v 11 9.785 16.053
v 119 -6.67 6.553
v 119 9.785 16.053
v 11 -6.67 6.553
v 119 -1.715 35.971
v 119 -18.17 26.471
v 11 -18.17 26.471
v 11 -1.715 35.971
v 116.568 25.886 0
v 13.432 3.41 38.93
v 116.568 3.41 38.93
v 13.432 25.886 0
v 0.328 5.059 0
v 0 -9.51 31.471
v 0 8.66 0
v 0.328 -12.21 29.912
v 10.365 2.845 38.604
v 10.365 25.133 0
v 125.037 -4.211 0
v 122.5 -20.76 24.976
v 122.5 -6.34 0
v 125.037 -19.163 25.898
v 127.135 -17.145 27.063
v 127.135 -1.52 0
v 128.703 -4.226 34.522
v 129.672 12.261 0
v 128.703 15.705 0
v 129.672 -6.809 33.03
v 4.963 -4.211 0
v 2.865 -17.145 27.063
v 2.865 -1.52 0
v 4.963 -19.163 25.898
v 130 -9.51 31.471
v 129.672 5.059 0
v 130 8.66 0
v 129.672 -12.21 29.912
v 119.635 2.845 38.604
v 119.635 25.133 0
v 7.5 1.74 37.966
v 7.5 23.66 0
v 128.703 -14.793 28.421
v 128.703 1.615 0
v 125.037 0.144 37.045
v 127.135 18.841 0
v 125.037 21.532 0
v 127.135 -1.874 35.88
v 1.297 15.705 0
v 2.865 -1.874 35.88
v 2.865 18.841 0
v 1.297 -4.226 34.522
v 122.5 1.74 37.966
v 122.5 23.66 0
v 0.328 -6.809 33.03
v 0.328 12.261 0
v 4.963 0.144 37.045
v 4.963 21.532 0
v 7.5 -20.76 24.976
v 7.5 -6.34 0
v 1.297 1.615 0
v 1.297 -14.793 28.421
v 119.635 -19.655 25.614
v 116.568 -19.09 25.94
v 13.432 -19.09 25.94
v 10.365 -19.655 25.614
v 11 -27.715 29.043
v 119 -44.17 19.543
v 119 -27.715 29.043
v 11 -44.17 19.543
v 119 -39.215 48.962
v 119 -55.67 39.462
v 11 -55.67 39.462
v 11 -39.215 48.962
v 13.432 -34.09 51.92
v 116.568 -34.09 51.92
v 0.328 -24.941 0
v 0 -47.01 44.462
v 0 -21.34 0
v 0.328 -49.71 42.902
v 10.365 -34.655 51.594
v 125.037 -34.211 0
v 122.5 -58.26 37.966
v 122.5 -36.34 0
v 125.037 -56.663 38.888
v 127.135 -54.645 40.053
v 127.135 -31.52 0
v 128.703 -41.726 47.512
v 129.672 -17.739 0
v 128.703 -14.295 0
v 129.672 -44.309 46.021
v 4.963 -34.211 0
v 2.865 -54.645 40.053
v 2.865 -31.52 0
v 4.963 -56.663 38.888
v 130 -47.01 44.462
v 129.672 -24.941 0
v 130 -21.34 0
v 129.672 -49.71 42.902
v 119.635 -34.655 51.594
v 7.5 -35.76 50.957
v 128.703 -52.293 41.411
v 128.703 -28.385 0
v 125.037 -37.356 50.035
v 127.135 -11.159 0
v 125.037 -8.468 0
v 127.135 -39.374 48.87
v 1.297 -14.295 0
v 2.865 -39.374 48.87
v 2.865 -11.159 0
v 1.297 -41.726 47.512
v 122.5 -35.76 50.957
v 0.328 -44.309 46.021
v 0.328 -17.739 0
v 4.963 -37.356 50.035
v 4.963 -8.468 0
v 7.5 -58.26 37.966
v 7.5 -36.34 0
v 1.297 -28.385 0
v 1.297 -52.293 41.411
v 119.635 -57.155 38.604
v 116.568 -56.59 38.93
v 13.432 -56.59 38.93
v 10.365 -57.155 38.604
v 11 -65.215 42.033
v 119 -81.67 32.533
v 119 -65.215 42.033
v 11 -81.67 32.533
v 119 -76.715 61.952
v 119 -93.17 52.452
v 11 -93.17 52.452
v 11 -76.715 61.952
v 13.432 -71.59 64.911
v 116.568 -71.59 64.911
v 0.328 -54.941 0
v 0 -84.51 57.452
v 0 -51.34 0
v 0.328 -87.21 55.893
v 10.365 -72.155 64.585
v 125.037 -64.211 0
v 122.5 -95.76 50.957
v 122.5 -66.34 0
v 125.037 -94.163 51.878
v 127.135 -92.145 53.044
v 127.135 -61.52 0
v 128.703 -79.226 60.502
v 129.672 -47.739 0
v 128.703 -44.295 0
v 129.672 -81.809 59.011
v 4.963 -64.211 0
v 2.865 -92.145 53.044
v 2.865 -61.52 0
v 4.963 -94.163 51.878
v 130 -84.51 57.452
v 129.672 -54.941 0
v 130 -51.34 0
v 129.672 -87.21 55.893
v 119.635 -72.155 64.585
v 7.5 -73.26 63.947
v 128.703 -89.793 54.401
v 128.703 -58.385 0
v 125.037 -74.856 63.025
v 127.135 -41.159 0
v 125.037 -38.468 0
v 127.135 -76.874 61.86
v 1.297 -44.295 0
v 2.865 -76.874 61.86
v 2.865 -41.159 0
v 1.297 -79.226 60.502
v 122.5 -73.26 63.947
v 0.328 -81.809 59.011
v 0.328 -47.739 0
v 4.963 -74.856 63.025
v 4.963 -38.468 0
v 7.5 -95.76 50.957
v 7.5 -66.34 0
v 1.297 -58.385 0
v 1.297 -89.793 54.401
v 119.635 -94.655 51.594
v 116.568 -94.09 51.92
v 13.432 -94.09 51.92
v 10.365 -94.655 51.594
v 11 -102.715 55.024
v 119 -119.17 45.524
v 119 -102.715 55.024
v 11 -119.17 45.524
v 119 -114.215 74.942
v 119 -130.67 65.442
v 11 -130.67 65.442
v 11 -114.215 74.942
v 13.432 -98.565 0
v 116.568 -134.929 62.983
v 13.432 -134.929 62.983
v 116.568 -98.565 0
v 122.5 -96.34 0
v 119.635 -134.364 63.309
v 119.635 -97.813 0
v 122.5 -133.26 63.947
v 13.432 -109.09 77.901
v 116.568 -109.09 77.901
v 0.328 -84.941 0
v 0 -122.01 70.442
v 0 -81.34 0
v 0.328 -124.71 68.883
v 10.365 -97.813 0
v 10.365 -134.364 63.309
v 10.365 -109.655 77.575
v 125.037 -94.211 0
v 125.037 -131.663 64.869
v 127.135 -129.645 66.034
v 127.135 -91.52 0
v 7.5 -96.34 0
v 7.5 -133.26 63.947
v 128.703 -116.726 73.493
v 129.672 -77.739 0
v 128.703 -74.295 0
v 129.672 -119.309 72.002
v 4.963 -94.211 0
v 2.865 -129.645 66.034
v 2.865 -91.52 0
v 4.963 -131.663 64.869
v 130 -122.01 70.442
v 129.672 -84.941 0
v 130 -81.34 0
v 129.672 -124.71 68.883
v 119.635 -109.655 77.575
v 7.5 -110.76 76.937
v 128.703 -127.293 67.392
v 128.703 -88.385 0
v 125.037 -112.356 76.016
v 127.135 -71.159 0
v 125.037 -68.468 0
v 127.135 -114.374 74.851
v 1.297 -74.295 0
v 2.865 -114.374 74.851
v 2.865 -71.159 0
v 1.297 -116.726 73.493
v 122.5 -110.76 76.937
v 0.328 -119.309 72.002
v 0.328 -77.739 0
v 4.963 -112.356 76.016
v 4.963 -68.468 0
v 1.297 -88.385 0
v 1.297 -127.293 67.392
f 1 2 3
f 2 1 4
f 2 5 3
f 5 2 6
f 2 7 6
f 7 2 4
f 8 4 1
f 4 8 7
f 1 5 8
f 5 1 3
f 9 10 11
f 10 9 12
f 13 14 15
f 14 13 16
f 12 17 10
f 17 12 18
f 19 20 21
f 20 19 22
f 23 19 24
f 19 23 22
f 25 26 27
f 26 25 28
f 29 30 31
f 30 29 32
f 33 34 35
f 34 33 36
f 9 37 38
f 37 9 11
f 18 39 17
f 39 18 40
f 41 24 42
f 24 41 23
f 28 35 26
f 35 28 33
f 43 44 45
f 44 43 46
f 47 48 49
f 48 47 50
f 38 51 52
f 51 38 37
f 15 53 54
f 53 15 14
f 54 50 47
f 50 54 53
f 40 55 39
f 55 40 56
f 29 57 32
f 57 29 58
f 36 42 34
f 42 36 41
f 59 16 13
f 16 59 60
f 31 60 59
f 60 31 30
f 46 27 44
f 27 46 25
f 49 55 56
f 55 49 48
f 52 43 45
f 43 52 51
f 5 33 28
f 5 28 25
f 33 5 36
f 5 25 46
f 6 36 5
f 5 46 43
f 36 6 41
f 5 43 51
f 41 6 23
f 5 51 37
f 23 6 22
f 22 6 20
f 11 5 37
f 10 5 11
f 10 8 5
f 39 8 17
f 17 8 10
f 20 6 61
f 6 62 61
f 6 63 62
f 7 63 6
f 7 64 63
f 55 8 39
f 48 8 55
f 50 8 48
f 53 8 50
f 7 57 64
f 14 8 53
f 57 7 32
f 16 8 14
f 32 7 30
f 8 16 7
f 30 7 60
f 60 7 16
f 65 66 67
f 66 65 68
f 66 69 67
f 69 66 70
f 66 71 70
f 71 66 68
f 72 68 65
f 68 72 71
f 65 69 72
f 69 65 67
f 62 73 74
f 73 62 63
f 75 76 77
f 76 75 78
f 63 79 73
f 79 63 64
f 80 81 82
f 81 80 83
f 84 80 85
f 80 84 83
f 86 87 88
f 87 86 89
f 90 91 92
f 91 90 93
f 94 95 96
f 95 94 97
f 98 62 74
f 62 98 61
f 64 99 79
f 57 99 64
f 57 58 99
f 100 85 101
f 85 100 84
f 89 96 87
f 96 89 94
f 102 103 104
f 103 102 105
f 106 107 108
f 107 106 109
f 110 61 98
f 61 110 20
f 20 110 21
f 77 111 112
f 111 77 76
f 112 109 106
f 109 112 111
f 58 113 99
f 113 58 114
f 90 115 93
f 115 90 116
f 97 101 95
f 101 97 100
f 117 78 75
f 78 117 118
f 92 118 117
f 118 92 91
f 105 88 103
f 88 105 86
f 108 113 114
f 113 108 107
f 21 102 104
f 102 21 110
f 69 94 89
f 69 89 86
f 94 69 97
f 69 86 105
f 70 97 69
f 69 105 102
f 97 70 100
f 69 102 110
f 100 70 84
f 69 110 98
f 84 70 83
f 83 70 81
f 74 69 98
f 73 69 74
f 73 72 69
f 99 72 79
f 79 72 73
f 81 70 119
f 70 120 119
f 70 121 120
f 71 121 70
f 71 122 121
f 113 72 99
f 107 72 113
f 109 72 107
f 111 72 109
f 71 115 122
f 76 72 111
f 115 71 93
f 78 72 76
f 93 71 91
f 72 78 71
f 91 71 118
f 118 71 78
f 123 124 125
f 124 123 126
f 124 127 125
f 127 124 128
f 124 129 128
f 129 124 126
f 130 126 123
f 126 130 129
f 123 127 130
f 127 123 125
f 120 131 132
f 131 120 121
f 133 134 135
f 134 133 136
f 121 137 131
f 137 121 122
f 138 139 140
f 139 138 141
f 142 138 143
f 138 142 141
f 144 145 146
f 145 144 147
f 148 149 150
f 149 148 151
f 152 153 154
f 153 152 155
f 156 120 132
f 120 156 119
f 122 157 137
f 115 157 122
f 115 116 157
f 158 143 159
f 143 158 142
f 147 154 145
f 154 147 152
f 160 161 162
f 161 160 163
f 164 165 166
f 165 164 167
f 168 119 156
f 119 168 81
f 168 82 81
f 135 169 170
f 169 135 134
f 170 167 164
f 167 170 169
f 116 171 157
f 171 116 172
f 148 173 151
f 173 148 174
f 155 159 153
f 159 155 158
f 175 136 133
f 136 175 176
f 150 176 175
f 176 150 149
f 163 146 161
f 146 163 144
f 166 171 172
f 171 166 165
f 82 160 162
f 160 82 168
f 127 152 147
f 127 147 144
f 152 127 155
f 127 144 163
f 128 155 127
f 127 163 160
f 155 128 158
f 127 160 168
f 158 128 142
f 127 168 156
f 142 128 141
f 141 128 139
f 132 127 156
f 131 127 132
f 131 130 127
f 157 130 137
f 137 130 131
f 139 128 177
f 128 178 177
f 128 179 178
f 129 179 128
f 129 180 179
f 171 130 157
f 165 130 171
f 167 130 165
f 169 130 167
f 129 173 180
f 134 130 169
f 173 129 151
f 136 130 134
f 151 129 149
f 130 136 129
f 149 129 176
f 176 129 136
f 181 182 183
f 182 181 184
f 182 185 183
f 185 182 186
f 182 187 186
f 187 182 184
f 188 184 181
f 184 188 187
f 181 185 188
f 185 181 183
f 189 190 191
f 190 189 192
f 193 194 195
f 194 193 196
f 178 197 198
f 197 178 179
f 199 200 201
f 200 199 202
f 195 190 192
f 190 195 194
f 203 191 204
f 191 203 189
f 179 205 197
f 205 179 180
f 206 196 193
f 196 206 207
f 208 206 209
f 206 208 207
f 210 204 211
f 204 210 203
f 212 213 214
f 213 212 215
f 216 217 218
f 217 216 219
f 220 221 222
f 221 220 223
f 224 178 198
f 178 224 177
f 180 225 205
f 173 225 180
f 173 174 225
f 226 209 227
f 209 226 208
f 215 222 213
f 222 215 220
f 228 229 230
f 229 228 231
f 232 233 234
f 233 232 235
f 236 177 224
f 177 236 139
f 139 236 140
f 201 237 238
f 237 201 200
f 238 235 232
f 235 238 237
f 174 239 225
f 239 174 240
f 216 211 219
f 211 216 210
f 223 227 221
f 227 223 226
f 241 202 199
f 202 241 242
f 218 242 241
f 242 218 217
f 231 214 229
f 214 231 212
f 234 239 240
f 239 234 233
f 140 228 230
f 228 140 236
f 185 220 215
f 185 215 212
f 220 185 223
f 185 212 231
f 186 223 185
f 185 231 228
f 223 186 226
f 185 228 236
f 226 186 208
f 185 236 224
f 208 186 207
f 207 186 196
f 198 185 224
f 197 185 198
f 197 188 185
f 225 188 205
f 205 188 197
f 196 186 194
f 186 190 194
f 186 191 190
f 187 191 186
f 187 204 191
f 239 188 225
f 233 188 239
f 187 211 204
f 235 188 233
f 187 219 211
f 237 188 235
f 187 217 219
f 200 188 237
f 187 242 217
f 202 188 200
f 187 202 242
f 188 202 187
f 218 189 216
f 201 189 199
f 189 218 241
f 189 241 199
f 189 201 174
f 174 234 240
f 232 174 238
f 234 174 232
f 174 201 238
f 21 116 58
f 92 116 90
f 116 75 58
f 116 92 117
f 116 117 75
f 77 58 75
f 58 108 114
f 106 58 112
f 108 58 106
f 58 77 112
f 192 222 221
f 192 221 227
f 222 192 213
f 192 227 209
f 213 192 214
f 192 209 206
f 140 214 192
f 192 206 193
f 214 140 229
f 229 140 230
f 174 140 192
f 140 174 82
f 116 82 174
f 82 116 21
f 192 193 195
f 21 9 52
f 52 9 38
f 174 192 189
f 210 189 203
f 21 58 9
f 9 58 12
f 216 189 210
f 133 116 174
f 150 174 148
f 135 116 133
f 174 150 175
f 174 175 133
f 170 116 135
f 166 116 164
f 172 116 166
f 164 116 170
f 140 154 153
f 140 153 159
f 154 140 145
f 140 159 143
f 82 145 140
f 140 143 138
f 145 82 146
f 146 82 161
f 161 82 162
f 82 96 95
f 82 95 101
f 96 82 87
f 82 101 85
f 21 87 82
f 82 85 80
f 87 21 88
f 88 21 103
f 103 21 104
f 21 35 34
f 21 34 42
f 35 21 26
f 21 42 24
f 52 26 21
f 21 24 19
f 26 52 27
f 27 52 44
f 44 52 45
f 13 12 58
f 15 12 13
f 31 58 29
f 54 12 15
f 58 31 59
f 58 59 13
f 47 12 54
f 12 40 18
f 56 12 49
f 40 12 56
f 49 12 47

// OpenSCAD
//Amount of cart slots
cart_count = 4; //[1:1:8]
//Cart type
cart_type = 5; //[0:Snes PAL, 1:Snes NTSC, 2:N64, 3:Gameboy/GBA, 4:DS/3DS, 5:NES, 6:Genesis]
//Support leg length (mm)
support_legs_length = 0; //[0:1:100]
//Cart angle (degree)
cart_angle = 30; //[0:1:30]
//Leveled
leveled = 0; //[0:False, 1:True]

module cart_cup(cup_height, cup_width, cup_depth, cart_hole_depth, support_legs_length, cup_angle) {
    
    difference() {
        
        union() {
            translate([0,cup_depth/2,0])
            hull() {
                translate([cup_depth/2,0,0])
                cylinder(h=cup_height, d=cup_depth);
                
                translate([cup_width-cup_depth/2,0,0])
                cylinder(h=cup_height, d=cup_depth);
            }
            
            
            for(j = [cup_width/4, cup_width*3/4]) {
            
                translate([j - 10/2, -(support_legs_length*cos(cup_angle)), 
                                                cup_depth*sin(cup_angle)])
                cube([10,   support_legs_length*cos(cup_angle),
                            support_legs_length*sin(cup_angle)]);
            }

        }
        translate([cup_width/2,0,cup_height-cart_hole_depth])
        children();
    }
}
    
module nescart() {
    translate([-108/2,5,0])
    linear_extrude(24)
    polygon([[0,0],[108,0],
            [108,19],[0,19]]);
    
    translate([-122/2,5,24])
    linear_extrude(110)
    polygon([[0,0],[122,0],
            [122,19],[0,19]]);
    
};
    
module snescart_pal() {
    translate([-130/2,5,0])
    linear_extrude(88)
    polygon([[0,0],[130,0],
            [130,10],[127,16],[120,18],[100,20],[70,22],
            [60,22],[30,20],[10,18],[3,16],[0,10]]);
    
};


module snescart_ntsc() {
    translate([-130/2,5,0])
    linear_extrude(88)
    polygon([
        [-4,0],[-4,19],[17,19],[17,22],
        [113,22],[113,19],[134,19],[134,0]    
    ]);
    
};

module gameboycart() {
    translate([-58/2,3,0])
    linear_extrude(65)
    polygon([[0,0],[58,0],
            [58,8],[0,8]]);
    
};

module dscart() {
    translate([-34/2,3,0])
    linear_extrude(35)
    polygon([[0,0],[34,0],
            [34,4.5],[0,4.5]]);
    
};

module n64cart() {
    translate([-118/2,5,0])
    linear_extrude(76)
    polygon([[0,0],[0,9],[1,13],[2,15],[3,16],[6,18],[9,19],
            [118-9,19],[118-6,18],[118-3,16],[118-2,15],[118-1,13],[118,9],[118,0]]);
    
};

module genesiscart() {
    translate([-110/2,5,0])
    linear_extrude(76)
    polygon([[0,0],[0,5],[0.3,7.6],[1.18,10.2],[2.6,12.5],[4.5,14.4],[6.8,15.8],
             [9.33,16.7],[12,17],[98,17],[100.67,16.7],[103.2,15.8],[105.5,14.4],
             [107.4,12.5],[108.82,10.2],[109.7,7.6],[110,5],[110,0]]);
}

module cart_stand(  amount_of_carts, delta_y, delta_h, angle,
                    cup_height, cup_width, cup_depth, cart_hole_depth, support_legs_length) {

    cut_from_bottom = sin(angle)*cup_depth;
                        
    difference() {
        union() {
            
            for(i = [0:amount_of_carts-1]) {
                translate([0, -i*delta_y, -cut_from_bottom])
                rotate([angle, 0, 0]) 
                    if (i==(amount_of_carts-1))
                        cart_cup(   cup_height + i*delta_h, cup_width, cup_depth,  
                                    cart_hole_depth, support_legs_length,                                                 angle) 
                        #children();
                    else
                        cart_cup(   cup_height + i*delta_h, cup_width, cup_depth,  
                                   cart_hole_depth, 0, 0)
                        #children();
                    
                    
                
            }
        }
        //ground
        translate([0, -delta_y*amount_of_carts - support_legs_length, -cut_from_bottom - support_legs_length])
        cube([cup_width, delta_y*(amount_of_carts+1) + support_legs_length, cut_from_bottom + support_legs_length]);
    }
}

//cart_stand(  amount_of_carts, delta_y, delta_h, angle,
//             cup_height, cup_width, cup_depth, cart_hole_depth, support_legs_length)

//cart_type: [0:Snes PAL, 1:Snes NTSC, 2:N64, 3:Gameboy/GBA, 4:DS/3DS, 5:NES, 6:Genesis]



if (cart_type == 0) {
    cart_stand(cart_count, 30, (leveled==1) ? 0 : 15, cart_angle, 30, 150, 30, 15, support_legs_length) snescart_pal();
}
if (cart_type == 1) {
    cart_stand(cart_count, 30, (leveled==1) ? 0 : 15, cart_angle, 30, 150, 30, 15, support_legs_length) snescart_ntsc();
}
if (cart_type == 2) {
    cart_stand(cart_count, 26, (leveled==1) ? 0 : 15, cart_angle, 30, 130, 26, 15, support_legs_length) n64cart();
}
if (cart_type == 3) {
    cart_stand(cart_count, 14, (leveled==1) ? 0 : 8, cart_angle, 15, 68, 14, 6, support_legs_length) gameboycart();
}
if (cart_type == 4) {
    cart_stand(cart_count, 9, (leveled==1) ? 0 : 5, cart_angle, 12, 40, 10, 6, support_legs_length) dscart();
}
if (cart_type == 5) {
    cart_stand(cart_count, 30, (leveled==1) ? 0 : 15, cart_angle, 45, 130, 30, 23, support_legs_length) nescart();
}
if (cart_type == 6) {
    cart_stand(cart_count, 26, (leveled==1) ? 0 : 15, cart_angle, 30, 125, 26, 15, support_legs_length) genesiscart();
}
